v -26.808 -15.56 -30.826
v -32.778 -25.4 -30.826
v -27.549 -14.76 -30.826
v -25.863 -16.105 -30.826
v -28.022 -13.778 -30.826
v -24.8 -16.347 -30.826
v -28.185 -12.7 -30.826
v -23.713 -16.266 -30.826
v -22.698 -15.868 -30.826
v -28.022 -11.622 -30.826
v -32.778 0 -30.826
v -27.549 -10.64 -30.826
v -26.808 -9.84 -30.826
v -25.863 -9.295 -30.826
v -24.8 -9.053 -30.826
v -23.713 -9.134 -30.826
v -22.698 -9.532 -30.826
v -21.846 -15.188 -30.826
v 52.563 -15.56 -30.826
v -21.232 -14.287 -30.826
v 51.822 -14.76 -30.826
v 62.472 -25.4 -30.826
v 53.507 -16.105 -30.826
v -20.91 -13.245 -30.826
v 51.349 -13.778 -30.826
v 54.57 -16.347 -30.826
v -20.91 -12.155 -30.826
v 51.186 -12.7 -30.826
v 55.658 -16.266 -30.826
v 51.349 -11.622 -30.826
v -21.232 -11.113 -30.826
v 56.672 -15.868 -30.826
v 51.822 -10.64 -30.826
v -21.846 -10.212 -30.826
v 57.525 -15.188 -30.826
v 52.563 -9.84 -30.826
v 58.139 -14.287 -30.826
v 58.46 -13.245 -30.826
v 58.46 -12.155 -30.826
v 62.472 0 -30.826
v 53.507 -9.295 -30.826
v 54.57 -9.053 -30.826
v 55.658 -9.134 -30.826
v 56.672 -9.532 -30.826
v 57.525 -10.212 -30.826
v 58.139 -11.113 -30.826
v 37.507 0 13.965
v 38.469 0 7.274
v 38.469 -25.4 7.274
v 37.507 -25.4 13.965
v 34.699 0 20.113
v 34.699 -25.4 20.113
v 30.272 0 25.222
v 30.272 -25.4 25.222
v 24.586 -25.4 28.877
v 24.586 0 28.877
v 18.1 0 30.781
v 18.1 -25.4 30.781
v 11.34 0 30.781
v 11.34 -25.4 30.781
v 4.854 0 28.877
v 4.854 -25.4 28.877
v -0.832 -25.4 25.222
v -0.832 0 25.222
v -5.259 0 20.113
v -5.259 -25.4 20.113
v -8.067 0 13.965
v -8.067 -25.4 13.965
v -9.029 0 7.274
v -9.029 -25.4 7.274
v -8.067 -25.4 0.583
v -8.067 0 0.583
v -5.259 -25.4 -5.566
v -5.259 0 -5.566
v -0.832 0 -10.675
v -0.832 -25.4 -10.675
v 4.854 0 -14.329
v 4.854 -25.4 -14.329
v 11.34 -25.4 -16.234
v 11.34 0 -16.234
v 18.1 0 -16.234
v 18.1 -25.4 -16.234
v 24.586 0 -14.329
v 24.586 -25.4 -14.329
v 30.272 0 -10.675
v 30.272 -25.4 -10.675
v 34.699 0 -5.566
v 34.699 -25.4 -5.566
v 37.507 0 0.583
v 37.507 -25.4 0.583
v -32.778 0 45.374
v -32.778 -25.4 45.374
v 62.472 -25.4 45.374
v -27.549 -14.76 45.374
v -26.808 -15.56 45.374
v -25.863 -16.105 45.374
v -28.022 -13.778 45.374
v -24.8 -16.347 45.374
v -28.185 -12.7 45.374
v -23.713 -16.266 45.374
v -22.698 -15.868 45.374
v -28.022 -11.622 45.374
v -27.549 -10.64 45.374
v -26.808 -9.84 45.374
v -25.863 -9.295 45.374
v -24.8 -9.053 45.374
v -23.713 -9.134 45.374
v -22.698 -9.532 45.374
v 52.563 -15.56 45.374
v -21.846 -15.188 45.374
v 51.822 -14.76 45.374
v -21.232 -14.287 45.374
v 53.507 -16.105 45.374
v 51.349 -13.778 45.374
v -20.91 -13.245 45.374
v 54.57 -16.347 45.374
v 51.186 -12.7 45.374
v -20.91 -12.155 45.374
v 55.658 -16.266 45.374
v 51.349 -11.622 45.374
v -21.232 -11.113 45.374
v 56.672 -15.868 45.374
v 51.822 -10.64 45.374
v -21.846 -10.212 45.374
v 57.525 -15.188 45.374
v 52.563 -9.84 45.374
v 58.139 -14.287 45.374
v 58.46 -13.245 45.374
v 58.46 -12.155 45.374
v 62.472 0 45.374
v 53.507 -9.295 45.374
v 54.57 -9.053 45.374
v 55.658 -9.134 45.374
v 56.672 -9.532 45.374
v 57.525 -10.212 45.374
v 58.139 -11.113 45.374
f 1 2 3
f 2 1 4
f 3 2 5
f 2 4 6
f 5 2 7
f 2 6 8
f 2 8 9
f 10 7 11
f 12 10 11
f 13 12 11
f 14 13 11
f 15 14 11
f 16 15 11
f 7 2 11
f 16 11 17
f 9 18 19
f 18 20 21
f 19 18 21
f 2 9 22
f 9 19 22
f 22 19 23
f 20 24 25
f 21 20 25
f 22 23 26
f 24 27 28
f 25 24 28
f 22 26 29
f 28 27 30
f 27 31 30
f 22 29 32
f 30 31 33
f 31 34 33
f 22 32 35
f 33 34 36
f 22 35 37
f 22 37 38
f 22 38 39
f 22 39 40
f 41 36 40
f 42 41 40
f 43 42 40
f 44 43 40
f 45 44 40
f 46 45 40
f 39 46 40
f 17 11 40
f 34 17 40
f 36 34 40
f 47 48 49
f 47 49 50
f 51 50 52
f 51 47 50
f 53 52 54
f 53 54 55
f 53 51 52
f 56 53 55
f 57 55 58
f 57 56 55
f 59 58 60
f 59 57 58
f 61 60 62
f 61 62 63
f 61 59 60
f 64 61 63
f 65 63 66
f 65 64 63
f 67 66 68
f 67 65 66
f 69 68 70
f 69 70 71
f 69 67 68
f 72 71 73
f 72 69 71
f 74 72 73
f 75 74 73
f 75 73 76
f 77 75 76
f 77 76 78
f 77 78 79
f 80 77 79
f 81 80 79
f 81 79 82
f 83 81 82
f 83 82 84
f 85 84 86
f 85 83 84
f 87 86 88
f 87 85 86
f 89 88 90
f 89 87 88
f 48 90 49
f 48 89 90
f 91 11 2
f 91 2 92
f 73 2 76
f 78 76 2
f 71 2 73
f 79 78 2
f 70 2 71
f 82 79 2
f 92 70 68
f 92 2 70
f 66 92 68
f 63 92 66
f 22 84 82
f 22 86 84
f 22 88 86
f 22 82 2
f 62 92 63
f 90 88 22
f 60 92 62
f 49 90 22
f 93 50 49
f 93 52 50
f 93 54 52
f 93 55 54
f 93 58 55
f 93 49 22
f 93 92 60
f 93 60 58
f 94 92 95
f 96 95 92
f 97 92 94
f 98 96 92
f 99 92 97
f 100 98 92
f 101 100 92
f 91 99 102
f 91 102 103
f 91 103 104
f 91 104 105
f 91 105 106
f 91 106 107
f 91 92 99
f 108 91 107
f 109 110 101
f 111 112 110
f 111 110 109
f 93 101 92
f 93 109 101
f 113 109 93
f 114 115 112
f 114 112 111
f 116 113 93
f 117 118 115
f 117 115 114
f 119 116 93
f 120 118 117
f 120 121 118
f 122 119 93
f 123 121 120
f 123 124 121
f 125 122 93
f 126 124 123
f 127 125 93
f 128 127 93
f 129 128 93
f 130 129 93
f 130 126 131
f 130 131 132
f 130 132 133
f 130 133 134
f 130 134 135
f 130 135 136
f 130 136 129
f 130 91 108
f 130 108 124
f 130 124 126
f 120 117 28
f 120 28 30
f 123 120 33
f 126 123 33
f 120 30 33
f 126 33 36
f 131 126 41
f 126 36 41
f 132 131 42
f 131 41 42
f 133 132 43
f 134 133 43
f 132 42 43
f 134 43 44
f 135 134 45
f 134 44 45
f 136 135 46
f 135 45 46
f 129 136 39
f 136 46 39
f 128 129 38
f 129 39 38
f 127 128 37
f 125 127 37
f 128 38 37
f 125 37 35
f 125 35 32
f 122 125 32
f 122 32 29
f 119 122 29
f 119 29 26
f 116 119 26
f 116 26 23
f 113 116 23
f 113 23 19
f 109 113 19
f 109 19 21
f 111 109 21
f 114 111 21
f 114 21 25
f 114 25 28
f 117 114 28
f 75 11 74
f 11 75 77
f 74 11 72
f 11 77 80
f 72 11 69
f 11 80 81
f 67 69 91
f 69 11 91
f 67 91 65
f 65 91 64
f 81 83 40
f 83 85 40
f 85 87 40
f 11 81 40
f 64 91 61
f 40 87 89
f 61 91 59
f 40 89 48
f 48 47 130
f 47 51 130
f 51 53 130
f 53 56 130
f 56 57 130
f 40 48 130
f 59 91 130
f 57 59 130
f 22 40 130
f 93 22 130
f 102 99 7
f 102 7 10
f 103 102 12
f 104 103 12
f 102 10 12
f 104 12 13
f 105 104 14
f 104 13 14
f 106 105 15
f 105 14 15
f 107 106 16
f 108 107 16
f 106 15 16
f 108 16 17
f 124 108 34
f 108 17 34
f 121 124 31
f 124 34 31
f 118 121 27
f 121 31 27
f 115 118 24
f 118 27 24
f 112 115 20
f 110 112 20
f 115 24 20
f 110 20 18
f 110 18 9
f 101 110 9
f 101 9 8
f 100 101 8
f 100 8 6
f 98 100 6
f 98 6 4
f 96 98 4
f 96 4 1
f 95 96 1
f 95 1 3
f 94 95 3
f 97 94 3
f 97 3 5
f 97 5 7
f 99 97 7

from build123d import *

# Parameters (mm, degrees)
F0_W     = 95.25
F0_H     = 76.2
F0_R     = 23.749
F1_DEPTH = 25.4
F3_D     = 7.3152


with BuildPart() as f1:
    # F0 (on Front) → F1 (new body)
    with BuildSketch(Plane.XZ):
        with Locations((14.847173, 7.273737)):
            Rectangle(F0_W, F0_H)
        with Locations((14.720173, 7.273737)):
            Circle(F0_R, mode=Mode.SUBTRACT)
    extrude(amount=F1_DEPTH)

    # F3 (through all)
    with Locations(Plane.XY.offset(45.373737)):
        with Locations((-24.527139, -12.7), (54.843643, -12.7)):
            Hole(F3_D / 2)


solid = f1.part
